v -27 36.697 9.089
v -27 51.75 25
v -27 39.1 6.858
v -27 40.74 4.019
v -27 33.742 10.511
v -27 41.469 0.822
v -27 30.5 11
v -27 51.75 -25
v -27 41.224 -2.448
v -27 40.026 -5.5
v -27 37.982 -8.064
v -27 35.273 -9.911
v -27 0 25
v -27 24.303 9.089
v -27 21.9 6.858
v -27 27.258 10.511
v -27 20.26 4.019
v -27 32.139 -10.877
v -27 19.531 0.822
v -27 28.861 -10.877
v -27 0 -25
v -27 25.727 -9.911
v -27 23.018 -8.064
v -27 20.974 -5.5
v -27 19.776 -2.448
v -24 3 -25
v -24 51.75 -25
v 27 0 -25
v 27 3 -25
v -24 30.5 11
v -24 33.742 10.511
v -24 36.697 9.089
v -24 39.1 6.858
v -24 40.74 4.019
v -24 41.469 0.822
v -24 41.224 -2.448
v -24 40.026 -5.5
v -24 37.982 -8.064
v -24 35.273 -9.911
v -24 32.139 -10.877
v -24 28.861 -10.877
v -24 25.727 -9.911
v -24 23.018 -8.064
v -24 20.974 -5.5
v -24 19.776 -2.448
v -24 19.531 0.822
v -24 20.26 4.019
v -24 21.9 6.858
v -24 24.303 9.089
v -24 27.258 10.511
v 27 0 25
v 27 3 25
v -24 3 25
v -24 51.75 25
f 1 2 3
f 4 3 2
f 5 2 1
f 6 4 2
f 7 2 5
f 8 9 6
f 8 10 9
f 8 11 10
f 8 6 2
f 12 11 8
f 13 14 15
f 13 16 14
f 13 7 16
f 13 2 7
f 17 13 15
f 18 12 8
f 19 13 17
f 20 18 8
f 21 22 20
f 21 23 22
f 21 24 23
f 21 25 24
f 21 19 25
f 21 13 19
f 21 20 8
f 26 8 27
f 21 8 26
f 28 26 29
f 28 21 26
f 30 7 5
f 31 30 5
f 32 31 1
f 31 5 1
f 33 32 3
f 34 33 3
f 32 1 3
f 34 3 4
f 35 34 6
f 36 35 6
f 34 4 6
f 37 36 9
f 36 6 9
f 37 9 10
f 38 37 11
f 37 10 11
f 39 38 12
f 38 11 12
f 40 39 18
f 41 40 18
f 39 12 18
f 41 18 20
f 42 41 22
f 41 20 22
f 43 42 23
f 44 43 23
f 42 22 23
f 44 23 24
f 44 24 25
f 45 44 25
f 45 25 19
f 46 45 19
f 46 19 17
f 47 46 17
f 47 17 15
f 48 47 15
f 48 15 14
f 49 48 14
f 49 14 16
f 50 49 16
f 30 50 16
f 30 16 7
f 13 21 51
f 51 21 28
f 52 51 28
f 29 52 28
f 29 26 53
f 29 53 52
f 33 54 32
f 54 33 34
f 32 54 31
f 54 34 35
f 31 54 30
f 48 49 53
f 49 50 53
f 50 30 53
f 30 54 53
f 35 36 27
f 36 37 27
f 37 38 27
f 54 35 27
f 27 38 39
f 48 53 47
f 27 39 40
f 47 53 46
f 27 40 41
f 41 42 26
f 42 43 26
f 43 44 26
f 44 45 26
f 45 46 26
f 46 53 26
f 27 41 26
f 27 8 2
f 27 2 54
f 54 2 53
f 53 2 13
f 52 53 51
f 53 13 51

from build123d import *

# Parameters (mm, degrees)
SKETCH1_W           = 54
SKETCH1_H           = 50
BOSS_EXTRUDE1_DEPTH = 3
SKETCH2_W           = 3
SKETCH2_H           = 50
BOSS_EXTRUDE2_DEPTH = 48.75
SKETCH3_R           = 11
CUT_EXTRUDE1_DEPTH  = 55


with BuildPart() as part:
    # Sketch1 → Boss-Extrude1 (new body)
    with BuildSketch(Plane(origin=(0, 0, 0), x_dir=(1, 0, 0), z_dir=(0, 1, 0))):
        Rectangle(SKETCH1_W, SKETCH1_H)
    extrude(amount=BOSS_EXTRUDE1_DEPTH)

    # Sketch2 → Boss-Extrude2 (add)
    with BuildSketch(Plane(origin=(0, 3, 0), x_dir=(1, 0, 0), z_dir=(0, 1, 0))):
        with Locations((-25.5, 0)):
            Rectangle(SKETCH2_W, SKETCH2_H)
    extrude(amount=BOSS_EXTRUDE2_DEPTH)

    # Sketch3 → Cut-Extrude1 (cut, through all)
    with BuildSketch(Plane.ZY.offset(27)):
        with Locations((0, 30.5)):
            Circle(SKETCH3_R)
    extrude(amount=-CUT_EXTRUDE1_DEPTH, mode=Mode.SUBTRACT)


solid = part.part
